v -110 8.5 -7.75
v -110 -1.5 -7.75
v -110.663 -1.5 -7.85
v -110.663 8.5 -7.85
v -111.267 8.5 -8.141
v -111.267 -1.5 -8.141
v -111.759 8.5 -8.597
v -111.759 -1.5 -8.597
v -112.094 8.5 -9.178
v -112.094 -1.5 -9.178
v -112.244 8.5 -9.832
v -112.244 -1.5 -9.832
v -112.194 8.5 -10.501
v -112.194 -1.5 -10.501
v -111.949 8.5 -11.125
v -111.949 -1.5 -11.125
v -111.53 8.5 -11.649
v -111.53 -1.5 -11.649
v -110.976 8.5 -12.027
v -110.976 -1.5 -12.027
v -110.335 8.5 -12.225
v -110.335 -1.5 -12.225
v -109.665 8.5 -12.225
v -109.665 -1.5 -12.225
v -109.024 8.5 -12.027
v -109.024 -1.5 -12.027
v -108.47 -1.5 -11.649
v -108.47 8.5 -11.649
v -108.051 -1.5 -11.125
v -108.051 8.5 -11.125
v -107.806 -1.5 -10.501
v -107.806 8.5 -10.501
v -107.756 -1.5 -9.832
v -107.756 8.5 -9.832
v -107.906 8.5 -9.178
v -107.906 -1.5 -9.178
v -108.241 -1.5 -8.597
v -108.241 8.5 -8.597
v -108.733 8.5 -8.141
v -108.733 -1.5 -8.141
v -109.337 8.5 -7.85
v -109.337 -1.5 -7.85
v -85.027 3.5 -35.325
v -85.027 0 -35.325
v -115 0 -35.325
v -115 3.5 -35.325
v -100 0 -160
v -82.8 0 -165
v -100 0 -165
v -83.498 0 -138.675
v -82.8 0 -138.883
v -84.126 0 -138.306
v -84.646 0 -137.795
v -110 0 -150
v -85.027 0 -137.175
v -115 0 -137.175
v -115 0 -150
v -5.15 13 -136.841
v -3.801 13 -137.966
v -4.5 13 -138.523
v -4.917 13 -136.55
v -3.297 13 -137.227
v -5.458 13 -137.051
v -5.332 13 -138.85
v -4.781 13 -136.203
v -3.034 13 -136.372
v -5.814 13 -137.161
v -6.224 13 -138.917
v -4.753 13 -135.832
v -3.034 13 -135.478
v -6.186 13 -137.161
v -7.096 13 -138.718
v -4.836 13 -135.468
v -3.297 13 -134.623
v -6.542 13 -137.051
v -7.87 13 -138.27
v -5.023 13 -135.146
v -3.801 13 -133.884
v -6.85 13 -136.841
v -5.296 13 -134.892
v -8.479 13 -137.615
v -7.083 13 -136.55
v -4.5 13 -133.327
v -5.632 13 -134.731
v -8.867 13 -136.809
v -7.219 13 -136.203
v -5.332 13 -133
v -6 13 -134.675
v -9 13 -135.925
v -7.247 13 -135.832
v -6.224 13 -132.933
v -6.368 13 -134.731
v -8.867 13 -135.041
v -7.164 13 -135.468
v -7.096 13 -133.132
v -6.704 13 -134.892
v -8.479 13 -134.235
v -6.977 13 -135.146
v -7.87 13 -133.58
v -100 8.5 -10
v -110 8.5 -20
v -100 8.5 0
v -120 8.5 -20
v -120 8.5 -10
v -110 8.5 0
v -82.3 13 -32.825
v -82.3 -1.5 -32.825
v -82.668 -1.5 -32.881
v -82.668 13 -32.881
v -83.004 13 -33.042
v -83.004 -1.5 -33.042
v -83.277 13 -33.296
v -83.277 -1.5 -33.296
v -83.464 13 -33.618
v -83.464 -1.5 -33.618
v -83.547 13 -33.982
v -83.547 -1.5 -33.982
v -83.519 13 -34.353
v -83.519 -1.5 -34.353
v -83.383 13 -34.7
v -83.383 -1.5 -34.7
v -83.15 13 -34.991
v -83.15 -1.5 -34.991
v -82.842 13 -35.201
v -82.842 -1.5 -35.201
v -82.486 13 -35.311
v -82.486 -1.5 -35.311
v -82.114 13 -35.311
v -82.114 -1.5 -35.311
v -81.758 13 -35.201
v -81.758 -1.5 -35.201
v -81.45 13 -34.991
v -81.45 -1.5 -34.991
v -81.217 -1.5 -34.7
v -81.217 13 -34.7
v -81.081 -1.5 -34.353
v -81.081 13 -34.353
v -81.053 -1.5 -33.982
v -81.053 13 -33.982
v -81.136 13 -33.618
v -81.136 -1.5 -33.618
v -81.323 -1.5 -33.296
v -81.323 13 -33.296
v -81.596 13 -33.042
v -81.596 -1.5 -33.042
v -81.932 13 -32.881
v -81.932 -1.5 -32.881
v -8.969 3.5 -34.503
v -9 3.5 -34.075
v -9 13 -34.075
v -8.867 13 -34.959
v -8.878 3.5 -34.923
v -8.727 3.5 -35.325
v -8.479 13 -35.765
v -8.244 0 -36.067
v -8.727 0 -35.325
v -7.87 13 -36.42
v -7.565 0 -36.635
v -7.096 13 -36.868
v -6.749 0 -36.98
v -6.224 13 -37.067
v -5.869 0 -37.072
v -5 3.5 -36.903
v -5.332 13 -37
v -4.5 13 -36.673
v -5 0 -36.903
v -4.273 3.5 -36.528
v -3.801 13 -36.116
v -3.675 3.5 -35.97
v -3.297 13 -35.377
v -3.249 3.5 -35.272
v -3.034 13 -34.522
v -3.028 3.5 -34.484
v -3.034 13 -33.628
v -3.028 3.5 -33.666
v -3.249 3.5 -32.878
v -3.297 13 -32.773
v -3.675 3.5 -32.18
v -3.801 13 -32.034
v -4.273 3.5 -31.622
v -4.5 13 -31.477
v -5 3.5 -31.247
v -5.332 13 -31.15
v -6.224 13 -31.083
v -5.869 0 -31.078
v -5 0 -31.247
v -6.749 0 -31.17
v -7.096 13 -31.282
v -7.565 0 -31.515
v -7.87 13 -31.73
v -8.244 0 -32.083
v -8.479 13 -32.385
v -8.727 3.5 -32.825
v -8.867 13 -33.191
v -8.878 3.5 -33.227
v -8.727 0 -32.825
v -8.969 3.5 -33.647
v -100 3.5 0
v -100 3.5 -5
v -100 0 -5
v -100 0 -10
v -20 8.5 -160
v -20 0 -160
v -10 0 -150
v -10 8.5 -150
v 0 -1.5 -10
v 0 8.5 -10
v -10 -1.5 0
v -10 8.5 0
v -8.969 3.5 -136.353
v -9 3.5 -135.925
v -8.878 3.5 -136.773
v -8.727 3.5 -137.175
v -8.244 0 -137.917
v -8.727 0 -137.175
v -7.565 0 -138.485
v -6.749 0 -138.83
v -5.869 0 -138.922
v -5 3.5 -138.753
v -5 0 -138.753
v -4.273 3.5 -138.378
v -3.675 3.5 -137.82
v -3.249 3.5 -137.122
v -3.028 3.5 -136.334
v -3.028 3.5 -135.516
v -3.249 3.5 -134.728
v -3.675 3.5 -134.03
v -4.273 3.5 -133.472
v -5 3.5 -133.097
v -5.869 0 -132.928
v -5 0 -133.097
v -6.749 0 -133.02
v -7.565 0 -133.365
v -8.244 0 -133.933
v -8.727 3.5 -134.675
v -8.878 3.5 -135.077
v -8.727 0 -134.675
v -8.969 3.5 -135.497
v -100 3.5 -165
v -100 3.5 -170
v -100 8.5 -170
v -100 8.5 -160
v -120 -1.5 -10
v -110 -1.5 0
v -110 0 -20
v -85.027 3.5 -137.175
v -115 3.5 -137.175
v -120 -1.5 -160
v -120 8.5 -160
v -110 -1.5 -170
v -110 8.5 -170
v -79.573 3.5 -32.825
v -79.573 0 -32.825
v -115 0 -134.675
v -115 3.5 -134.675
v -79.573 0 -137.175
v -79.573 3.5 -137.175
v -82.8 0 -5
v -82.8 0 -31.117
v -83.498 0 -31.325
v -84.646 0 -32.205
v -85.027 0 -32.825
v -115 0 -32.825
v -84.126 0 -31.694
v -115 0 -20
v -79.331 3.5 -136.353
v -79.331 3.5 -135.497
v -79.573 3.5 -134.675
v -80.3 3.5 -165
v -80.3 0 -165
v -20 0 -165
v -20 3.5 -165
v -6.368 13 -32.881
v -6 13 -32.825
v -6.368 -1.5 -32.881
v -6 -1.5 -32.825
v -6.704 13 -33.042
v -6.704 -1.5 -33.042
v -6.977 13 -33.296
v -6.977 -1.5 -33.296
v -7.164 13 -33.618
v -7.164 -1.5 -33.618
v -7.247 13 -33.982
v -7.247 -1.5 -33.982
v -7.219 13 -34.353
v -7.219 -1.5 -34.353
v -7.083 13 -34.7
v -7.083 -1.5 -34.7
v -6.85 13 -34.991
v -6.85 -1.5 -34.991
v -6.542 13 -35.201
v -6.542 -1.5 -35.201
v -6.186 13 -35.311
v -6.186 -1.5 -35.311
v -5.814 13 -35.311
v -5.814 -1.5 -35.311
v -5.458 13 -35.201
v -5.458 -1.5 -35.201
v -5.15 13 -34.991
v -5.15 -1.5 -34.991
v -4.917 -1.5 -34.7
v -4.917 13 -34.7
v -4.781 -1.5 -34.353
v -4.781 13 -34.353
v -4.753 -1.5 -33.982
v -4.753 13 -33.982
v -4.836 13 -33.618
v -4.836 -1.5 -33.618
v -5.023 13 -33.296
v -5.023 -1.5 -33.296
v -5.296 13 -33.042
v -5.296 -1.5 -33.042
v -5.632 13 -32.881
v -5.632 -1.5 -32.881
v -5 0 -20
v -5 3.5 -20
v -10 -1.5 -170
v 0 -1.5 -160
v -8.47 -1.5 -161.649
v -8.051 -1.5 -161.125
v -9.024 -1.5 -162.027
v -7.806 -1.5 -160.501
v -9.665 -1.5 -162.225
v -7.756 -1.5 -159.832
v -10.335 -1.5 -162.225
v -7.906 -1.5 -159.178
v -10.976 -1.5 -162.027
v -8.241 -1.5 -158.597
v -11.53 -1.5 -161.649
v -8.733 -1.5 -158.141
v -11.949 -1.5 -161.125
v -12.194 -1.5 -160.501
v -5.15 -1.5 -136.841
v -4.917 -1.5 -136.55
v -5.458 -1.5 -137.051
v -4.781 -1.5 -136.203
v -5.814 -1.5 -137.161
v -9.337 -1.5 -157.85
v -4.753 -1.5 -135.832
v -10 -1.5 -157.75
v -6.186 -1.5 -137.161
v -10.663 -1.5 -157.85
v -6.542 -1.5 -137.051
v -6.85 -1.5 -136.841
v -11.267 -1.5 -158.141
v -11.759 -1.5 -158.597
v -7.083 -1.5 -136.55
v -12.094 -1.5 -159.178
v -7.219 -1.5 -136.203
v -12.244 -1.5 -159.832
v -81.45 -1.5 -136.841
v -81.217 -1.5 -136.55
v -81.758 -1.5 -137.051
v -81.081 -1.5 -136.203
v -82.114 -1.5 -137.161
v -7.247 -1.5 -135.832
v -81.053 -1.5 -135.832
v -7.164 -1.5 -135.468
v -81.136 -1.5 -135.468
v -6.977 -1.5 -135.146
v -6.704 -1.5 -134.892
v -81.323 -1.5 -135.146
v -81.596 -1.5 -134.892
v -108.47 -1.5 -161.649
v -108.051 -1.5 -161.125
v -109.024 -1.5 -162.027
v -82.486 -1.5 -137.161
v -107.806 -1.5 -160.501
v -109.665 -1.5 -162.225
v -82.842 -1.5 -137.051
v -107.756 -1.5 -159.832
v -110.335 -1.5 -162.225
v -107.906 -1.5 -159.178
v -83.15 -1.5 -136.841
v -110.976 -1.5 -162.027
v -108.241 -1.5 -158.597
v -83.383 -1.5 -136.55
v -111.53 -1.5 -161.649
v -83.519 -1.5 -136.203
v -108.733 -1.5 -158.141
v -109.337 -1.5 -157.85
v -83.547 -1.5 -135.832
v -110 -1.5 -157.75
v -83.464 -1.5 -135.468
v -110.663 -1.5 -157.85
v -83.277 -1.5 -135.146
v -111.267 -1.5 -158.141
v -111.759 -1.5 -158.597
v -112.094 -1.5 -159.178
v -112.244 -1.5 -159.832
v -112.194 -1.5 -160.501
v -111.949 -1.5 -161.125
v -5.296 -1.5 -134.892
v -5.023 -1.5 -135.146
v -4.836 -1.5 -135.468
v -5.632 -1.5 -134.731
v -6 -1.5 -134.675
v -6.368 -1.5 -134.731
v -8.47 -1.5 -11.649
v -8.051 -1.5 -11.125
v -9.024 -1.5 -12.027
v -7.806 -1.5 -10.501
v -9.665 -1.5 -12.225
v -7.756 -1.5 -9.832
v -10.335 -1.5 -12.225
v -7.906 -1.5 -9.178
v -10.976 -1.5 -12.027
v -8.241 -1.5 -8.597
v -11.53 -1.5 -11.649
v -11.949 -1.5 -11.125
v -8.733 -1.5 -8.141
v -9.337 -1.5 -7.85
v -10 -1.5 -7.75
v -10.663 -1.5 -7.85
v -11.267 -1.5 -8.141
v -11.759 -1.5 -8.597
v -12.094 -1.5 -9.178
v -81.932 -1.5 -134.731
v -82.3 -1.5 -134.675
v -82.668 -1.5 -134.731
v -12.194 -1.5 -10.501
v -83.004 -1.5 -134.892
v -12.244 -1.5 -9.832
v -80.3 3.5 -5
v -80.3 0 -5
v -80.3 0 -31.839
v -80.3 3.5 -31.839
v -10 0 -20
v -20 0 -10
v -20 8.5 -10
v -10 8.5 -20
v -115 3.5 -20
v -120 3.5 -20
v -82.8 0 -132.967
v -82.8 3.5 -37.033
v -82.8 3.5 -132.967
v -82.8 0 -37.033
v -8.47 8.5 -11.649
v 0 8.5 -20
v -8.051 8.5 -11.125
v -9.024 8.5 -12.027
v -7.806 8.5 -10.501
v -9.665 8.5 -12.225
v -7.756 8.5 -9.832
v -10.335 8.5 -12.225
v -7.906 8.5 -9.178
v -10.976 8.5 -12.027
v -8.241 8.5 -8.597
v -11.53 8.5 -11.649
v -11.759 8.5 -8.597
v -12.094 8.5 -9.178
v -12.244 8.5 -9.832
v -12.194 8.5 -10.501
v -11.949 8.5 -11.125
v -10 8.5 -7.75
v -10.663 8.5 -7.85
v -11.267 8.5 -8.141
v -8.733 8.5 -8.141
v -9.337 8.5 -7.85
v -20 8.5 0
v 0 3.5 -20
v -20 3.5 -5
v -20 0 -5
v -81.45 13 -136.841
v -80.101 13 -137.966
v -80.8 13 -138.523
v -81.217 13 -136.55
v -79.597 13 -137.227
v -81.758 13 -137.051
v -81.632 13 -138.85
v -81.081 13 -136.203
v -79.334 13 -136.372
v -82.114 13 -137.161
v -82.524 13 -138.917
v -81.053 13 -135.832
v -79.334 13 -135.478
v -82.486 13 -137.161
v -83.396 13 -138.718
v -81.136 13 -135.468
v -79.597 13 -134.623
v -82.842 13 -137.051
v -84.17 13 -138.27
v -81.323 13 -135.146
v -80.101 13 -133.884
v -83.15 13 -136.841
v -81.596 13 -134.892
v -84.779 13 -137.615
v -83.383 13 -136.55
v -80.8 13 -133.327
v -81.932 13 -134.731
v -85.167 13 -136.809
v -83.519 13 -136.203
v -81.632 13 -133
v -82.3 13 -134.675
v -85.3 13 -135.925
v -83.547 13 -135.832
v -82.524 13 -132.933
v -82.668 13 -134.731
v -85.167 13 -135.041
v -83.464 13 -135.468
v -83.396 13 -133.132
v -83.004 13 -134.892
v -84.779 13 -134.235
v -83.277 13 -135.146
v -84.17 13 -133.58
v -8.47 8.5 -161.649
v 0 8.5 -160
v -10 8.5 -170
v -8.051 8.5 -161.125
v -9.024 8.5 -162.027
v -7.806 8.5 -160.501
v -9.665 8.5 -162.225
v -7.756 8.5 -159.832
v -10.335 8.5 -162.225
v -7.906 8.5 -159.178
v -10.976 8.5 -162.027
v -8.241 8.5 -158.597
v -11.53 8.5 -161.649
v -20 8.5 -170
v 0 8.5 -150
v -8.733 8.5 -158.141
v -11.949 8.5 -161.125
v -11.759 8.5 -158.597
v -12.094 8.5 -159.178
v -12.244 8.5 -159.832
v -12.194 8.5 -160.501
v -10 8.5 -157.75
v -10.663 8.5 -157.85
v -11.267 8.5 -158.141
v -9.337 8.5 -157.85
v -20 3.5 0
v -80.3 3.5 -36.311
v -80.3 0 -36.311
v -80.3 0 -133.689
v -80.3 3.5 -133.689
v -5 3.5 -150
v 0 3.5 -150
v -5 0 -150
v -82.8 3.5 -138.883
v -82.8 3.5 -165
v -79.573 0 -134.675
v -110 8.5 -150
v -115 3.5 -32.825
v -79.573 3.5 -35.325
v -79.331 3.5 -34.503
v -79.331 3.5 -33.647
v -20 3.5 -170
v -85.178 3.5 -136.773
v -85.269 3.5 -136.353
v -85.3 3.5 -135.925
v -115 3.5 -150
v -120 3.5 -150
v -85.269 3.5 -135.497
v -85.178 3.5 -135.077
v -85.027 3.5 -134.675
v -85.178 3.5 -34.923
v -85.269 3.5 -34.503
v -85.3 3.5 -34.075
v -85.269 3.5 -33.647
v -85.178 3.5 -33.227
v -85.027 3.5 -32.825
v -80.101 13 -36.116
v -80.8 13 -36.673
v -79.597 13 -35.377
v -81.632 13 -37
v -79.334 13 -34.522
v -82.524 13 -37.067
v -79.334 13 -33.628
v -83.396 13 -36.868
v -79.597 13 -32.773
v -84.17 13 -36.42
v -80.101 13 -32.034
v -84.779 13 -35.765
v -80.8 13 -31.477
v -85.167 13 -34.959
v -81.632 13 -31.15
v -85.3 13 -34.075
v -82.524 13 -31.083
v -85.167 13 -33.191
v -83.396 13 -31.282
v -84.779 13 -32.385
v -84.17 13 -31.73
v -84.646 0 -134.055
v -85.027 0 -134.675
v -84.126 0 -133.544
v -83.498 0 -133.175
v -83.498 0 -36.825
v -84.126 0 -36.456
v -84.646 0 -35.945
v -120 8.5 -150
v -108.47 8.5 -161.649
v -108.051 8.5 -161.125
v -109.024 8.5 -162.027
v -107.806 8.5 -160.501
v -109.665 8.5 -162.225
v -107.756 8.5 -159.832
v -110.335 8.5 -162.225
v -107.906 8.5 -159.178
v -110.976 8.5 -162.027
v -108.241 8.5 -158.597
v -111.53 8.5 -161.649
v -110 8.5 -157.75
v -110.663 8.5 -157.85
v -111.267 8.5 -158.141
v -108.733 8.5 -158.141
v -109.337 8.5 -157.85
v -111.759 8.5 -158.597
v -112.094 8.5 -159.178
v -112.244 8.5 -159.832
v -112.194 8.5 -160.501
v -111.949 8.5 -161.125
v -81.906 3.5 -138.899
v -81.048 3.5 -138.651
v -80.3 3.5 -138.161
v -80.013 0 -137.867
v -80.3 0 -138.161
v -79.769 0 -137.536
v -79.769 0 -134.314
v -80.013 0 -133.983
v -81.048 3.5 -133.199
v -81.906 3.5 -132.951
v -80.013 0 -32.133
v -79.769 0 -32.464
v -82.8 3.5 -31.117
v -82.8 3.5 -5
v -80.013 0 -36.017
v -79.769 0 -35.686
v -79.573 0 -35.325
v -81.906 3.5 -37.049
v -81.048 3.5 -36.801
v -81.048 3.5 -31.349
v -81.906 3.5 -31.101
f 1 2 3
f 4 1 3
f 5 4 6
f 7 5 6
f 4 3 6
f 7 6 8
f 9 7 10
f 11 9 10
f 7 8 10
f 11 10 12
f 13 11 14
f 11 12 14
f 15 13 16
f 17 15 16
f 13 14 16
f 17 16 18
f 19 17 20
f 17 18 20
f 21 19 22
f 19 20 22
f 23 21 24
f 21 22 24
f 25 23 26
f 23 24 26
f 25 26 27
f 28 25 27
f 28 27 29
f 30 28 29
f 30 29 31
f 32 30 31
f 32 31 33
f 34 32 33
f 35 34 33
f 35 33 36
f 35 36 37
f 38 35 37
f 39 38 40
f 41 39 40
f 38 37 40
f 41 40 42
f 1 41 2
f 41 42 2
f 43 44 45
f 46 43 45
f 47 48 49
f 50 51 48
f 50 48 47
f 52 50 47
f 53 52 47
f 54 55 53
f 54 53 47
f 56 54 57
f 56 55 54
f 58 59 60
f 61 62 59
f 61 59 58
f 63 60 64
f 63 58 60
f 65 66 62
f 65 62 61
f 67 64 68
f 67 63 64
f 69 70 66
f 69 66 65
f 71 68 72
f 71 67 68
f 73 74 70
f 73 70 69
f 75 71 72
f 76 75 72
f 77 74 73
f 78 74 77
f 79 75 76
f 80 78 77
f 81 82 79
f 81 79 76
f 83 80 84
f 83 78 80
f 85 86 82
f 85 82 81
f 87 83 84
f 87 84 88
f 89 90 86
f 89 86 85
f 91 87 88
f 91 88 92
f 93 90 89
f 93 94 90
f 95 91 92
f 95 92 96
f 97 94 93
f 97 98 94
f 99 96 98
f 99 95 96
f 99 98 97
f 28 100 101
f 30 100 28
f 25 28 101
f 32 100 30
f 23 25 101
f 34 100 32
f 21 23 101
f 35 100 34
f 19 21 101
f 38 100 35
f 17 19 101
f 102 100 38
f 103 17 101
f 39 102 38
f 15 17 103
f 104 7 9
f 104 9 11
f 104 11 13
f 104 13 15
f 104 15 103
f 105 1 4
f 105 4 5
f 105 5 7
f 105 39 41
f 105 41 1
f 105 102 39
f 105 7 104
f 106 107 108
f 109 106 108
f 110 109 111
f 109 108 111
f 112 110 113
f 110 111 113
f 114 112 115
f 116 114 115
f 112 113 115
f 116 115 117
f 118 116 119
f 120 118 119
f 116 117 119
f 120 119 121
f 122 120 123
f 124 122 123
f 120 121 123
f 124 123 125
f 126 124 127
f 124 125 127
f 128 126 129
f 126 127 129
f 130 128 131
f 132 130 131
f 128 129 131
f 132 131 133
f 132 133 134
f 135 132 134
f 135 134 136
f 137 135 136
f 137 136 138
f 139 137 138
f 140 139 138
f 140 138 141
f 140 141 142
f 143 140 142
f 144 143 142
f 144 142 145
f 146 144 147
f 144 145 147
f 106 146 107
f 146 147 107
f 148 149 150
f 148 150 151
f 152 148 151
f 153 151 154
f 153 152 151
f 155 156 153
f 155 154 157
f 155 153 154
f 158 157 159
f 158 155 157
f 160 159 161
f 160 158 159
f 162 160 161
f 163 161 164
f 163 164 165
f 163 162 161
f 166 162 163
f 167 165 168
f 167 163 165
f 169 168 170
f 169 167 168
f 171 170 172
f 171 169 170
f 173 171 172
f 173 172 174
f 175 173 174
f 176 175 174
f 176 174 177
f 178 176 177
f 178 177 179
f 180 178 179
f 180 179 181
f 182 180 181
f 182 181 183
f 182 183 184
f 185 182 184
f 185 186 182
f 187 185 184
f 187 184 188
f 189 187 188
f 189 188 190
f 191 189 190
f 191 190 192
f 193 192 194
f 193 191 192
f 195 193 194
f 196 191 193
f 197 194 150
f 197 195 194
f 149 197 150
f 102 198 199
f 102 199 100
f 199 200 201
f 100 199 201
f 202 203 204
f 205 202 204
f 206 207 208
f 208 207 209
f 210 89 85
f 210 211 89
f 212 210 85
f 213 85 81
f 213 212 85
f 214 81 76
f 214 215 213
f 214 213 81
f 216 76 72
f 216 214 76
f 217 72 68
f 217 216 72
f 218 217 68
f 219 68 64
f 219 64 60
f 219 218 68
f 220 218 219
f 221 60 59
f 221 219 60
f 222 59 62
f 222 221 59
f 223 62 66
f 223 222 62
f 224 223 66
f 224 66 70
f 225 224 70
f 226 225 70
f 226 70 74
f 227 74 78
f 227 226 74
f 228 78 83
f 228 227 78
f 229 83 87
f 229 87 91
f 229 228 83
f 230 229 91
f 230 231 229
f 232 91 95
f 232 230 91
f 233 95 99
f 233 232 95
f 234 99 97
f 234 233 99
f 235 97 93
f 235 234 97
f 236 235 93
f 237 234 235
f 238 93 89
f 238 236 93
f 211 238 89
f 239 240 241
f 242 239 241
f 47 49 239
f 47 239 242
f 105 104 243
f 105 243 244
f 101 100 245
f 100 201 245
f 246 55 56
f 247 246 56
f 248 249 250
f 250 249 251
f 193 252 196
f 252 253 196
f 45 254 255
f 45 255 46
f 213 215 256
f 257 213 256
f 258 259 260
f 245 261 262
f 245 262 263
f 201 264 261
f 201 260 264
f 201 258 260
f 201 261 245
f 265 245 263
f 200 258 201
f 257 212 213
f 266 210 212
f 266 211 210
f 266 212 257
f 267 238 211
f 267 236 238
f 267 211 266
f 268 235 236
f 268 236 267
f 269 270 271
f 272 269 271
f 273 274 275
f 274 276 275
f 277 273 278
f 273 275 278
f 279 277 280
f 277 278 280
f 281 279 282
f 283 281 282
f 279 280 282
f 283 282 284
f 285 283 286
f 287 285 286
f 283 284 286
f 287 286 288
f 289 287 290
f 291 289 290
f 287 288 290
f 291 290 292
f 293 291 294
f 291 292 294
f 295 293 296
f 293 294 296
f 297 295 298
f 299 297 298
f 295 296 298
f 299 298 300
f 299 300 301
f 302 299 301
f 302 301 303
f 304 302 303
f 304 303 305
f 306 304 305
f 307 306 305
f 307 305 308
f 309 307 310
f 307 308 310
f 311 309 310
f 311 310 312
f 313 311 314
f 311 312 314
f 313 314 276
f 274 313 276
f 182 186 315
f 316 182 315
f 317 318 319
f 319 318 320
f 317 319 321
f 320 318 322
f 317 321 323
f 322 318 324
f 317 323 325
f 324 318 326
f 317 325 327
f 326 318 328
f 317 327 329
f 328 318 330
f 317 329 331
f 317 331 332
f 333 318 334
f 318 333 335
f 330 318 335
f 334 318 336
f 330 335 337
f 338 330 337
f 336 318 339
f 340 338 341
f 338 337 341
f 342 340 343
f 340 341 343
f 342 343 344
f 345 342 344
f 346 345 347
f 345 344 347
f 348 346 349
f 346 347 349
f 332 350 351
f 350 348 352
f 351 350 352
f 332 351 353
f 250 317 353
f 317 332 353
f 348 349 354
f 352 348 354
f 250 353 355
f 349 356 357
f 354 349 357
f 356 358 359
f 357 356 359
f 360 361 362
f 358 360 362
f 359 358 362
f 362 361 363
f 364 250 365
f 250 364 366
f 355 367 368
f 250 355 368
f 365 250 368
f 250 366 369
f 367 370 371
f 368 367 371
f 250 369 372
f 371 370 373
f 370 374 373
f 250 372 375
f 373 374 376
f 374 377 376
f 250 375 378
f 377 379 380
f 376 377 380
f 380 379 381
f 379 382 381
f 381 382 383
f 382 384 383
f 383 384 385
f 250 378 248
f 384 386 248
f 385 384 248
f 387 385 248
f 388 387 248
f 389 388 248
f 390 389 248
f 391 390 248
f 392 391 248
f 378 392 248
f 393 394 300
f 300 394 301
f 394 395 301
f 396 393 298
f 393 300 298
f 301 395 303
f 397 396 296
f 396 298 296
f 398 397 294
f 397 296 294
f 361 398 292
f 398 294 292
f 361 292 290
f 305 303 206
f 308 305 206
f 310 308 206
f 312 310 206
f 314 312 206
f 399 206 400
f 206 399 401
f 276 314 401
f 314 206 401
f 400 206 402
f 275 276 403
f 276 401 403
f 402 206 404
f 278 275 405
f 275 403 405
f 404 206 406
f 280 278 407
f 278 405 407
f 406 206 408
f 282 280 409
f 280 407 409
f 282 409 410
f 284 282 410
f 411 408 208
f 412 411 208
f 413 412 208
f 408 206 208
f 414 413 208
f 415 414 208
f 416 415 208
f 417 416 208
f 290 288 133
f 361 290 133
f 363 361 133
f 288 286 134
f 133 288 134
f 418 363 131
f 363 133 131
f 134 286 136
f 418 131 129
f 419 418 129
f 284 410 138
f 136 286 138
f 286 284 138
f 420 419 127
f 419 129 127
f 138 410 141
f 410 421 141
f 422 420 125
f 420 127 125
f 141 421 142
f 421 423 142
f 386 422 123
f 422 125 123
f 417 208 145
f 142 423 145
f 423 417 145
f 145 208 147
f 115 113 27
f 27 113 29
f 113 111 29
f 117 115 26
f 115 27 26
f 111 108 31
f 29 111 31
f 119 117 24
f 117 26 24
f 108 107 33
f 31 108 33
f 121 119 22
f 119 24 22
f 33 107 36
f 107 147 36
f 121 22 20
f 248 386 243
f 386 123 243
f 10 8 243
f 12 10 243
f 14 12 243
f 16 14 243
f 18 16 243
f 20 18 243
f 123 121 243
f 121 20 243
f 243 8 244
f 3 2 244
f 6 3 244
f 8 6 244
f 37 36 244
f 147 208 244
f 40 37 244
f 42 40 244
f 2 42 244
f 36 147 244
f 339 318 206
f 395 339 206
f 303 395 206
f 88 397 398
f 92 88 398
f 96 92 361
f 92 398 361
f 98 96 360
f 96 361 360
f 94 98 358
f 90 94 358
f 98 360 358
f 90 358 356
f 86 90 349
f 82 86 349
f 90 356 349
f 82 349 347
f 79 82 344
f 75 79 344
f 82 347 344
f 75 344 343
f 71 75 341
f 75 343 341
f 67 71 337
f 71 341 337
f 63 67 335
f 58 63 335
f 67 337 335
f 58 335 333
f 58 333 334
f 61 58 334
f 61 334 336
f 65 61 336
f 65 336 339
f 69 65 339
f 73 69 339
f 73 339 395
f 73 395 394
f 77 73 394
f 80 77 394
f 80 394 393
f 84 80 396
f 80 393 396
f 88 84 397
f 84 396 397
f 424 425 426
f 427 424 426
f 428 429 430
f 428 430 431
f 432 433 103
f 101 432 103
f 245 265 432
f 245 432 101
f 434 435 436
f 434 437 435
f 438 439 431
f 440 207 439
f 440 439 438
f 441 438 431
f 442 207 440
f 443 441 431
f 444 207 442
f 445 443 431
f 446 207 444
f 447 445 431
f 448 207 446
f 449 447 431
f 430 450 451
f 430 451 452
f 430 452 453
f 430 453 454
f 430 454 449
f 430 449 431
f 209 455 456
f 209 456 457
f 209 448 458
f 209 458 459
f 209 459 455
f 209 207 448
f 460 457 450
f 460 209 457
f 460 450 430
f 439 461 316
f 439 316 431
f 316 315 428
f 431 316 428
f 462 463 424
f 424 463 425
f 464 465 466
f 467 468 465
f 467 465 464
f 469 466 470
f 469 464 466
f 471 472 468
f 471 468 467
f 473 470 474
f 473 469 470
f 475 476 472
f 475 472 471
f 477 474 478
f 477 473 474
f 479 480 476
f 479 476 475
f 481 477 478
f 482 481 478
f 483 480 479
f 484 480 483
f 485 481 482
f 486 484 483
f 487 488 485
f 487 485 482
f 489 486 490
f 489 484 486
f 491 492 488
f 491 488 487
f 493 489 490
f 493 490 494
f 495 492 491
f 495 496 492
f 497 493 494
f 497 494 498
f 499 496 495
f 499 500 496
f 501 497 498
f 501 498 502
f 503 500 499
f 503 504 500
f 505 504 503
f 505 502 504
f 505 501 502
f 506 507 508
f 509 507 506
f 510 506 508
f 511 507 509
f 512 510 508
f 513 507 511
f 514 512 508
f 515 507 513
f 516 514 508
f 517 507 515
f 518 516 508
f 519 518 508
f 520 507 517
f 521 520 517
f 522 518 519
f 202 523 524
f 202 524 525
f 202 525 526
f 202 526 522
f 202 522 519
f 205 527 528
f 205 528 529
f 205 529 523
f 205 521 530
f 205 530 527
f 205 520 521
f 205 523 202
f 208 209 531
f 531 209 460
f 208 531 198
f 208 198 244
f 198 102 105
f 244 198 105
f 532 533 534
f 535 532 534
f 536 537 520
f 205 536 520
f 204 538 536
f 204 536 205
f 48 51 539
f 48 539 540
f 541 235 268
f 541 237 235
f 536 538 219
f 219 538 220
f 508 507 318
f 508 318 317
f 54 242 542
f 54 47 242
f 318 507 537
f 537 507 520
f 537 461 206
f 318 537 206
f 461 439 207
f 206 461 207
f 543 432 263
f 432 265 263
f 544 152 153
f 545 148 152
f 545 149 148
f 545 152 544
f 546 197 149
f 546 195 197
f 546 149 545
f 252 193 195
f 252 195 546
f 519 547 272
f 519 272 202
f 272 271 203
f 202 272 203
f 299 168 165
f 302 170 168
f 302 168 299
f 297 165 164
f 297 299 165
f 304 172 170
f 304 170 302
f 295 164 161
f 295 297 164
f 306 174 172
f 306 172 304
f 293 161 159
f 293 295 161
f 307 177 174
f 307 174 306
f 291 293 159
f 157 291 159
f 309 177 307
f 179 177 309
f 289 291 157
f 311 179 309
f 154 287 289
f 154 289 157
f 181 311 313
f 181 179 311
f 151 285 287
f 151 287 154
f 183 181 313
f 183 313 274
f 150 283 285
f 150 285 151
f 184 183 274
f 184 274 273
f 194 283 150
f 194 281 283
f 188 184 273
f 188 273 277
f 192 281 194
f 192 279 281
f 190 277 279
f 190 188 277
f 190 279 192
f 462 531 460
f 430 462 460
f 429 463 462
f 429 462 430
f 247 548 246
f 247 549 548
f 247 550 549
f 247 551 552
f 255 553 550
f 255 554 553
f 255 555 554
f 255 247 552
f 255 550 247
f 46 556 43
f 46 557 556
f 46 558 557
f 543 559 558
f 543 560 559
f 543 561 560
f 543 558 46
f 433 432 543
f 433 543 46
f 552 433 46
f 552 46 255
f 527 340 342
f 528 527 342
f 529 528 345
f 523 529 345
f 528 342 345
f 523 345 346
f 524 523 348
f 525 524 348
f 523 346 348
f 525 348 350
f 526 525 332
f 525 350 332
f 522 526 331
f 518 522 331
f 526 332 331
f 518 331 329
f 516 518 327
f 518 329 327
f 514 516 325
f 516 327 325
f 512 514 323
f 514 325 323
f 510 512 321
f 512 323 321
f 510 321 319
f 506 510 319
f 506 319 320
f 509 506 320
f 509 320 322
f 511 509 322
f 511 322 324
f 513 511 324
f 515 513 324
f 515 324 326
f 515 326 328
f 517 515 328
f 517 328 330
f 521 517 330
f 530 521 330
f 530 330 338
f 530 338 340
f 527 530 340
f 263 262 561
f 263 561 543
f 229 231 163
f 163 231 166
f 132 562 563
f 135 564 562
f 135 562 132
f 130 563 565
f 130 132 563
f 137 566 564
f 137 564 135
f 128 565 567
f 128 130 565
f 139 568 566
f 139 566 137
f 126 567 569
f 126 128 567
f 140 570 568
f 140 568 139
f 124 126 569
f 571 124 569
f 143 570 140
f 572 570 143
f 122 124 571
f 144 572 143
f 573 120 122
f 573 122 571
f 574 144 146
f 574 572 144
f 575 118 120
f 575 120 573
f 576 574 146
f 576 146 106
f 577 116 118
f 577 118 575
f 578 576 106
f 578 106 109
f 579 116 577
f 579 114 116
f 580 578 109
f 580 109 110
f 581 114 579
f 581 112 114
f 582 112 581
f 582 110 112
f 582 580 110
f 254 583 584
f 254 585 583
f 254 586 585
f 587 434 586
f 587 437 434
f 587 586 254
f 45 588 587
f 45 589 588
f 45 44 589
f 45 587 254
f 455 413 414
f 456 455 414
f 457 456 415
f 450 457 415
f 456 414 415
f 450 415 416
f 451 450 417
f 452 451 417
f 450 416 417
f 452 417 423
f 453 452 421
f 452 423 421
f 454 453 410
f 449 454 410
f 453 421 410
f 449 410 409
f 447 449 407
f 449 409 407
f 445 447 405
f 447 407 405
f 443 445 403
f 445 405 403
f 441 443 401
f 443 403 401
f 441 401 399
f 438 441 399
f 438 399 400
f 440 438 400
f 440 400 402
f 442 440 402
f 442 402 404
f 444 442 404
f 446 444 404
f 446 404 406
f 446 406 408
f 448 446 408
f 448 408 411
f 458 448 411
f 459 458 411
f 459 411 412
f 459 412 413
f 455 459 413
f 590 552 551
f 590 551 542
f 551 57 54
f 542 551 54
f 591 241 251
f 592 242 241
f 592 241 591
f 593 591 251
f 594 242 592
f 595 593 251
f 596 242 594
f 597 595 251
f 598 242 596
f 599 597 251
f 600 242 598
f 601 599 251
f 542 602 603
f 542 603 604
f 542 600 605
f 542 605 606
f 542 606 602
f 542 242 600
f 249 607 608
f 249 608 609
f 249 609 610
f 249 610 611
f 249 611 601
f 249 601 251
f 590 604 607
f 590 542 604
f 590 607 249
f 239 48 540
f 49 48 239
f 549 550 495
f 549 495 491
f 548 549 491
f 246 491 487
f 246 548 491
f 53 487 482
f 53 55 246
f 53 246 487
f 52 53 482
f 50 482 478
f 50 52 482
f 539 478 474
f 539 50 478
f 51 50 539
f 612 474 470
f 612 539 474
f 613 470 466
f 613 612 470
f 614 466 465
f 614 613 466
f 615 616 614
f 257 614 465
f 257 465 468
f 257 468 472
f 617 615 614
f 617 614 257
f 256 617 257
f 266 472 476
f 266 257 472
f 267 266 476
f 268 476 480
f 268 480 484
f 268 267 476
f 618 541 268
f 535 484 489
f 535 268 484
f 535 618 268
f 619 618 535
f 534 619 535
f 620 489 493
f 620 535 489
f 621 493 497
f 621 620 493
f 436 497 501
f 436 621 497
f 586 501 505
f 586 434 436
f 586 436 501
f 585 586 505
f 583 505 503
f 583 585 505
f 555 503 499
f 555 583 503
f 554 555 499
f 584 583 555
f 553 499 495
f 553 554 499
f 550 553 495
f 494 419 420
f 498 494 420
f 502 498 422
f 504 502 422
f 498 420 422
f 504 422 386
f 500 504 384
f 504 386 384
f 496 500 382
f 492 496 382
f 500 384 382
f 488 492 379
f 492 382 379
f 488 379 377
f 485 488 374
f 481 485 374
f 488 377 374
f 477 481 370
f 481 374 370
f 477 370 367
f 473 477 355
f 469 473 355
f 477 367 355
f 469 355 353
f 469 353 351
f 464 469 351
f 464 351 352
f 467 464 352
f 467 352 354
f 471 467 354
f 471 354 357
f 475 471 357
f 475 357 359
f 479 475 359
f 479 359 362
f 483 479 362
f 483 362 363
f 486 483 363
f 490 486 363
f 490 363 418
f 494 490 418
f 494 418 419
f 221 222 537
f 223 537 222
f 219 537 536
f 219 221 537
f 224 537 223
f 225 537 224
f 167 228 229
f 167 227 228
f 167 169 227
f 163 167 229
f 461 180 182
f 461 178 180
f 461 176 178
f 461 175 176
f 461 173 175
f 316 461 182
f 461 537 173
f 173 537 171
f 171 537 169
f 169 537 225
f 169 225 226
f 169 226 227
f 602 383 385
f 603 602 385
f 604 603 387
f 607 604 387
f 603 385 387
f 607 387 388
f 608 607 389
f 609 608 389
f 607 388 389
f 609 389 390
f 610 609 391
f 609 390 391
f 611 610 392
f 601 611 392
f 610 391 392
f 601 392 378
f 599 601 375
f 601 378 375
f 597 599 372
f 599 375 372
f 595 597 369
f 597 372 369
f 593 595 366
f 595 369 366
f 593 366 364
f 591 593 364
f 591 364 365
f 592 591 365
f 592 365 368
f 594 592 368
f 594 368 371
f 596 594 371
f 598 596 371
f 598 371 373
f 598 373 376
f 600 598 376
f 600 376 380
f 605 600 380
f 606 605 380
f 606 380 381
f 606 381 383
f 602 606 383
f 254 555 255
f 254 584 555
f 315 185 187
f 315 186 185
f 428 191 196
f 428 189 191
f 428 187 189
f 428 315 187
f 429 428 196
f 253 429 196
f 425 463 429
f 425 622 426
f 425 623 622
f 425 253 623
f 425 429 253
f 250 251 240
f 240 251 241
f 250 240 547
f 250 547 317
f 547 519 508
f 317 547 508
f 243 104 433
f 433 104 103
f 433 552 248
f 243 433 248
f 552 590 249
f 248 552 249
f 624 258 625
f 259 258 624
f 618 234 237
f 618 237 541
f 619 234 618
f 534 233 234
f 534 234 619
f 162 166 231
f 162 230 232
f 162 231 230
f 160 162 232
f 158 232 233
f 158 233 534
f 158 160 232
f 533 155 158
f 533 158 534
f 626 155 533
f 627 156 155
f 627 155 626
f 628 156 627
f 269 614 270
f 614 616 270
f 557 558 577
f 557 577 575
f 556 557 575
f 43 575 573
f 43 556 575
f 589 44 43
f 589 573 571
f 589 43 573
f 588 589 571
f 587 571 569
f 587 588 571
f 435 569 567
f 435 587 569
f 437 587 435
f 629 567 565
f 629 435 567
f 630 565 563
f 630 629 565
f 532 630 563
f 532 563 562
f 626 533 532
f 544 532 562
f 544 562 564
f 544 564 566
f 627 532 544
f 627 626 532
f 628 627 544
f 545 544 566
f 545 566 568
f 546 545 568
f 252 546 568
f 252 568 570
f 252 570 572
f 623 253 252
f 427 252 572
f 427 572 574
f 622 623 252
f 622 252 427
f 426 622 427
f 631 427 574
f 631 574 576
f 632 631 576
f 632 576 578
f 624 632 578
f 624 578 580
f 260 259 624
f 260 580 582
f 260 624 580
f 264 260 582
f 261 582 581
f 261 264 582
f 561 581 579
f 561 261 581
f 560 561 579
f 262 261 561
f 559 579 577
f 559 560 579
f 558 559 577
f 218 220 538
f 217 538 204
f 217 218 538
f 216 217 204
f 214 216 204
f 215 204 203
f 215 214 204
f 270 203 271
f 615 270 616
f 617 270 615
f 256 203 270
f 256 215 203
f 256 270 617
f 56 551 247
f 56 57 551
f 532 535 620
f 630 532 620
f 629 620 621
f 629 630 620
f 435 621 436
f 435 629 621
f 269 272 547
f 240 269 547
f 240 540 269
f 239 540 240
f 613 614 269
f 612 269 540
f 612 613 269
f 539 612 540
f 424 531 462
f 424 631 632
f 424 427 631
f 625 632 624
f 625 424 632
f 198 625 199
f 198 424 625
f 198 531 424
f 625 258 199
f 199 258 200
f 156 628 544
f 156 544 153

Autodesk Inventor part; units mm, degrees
ref_plane "YZ Plane" through (0, 0, 0) normal (1, 0, 0) x (0, 1, 0)
ref_plane "XZ Plane" through (0, 0, 0) normal (0, 1, 0) x (-1, 0, 0)
ref_plane "XY Plane" through (0, 0, 0) normal (0, 0, 1) x (1, 0, 0)
sketch "Base Sketch" plane through (0, 0, 0) normal (0, 1, 0) x (-1, 0, 0)
  line L0 (10, 0) -> (110, 0)
  line L1 (120, -10) -> (120, -160)
  line L2 (110, -170) -> (10, -170)
  line L3 (0, -160) -> (0, -10)
  line L4 (86.3, -30.165) -> (2, -30.165) construction
  line L5 (2, -30.165) -> (2, -139.835) construction
  line L6 (2, -139.835) -> (86.3, -139.835) construction
  line L7 (86.3, -139.835) -> (86.3, -30.165) construction
  line L8 (82.3, -34.075) -> (6, -34.075) construction
  line L9 (6, -34.075) -> (6, -135.925) construction
  line L10 (6, -135.925) -> (82.3, -135.925) construction
  line L11 (82.3, -135.925) -> (82.3, -34.075) construction
  line L12 (0, -10) -> (10, 0)
  line L13 (120, -10) -> (110, 0)
  line L14 (120, -160) -> (110, -170)
  line L15 (0, -160) -> (10, -170)
  line L16 (100, 0) -> (100, -10)
  line L17 (120, -20) -> (110, -20)
  line L18 (100, -10) -> (110, -20)
  line L19 (120, -85) -> (0, -85) construction
  line L20 (60, 0) -> (60, -170) construction
  line L21 (100, -170) -> (100, -160)
  line L22 (120, -150) -> (110, -150)
  line L23 (100, -160) -> (110, -150)
  line L24 (20, 0) -> (20, -10)
  line L25 (0, -20) -> (10, -20)
  line L26 (20, -10) -> (10, -20)
  line L27 (20, -170) -> (20, -160)
  line L28 (20, -160) -> (10, -150)
  line L29 (0, -150) -> (10, -150)
  circle A0 centre (82.3, -34.075) radius 3
  circle A1 centre (6, -34.075) radius 3
  circle A2 centre (82.3, -135.925) radius 3
  circle A3 centre (6, -135.925) radius 3
  line L30 (82.8, -5) -> (82.8, -31.117)
  line L31 (80.3, -5) -> (80.3, -31.8389)
  line L32 (80.3, -36.3111) -> (80.3, -133.6889)
  line L33 (80.3, -138.1611) -> (80.3, -165)
  line L34 (82.8, -37.033) -> (82.8, -132.967)
  line L35 (82.8, -138.883) -> (82.8, -165)
  line L36 (79.5728, -35.325) -> (8.7272, -35.325)
  line L37 (79.5728, -32.825) -> (8.7272, -32.825)
  line L38 (85.0272, -35.325) -> (115, -35.325)
  line L39 (85.0272, -32.825) -> (115, -32.825)
  line L40 (8.7272, -134.675) -> (79.5728, -134.675)
  line L41 (85.0272, -134.675) -> (115, -134.675)
  line L42 (8.7272, -137.175) -> (79.5728, -137.175)
  line L43 (85.0272, -137.175) -> (115, -137.175)
  line L44 (80.3, -165) -> (12.0711, -165)
  line L45 (12.0711, -165) -> (5, -157.9289)
  line L46 (5, -157.9289) -> (5, -12.0711)
  line L47 (5, -12.0711) -> (12.0711, -5)
  line L48 (12.0711, -5) -> (80.3, -5)
  line L49 (82.8, -165) -> (107.9289, -165)
  line L50 (107.9289, -165) -> (115, -157.9289)
  line L51 (115, -157.9289) -> (115, -137.175)
  line L52 (82.8, -5) -> (107.9289, -5)
  line L53 (107.9289, -5) -> (115, -12.0711)
  line L54 (115, -12.0711) -> (115, -32.825)
  line L55 (115, -134.675) -> (115, -35.325)
  point P0 (0, 0)
  point P1 (120, -170)
  point P2 (120, 0)
  point P3 (0, -170)
  point P4 (110, -10)
  point P5 (110, -160)
  point P6 (10, -10)
  point P7 (10, -160)
  point P8 (20, -165)
  point P9 (100, -165)
  point P10 (115, -150)
  point P11 (115, -20)
  point P12 (100, -5)
  point P13 (20, -5)
  point P14 (5, -150)
  point P15 (5, -138.7534)
  point P16 (5, -133.0966)
  point P17 (5, -36.9034)
  point P18 (5, -31.2466)
  point P19 (5, -20)
  dimension "d109" = 6
  dimension "d0" = 120
  dimension "d1" = 170
  dimension "d12" = 84.3
  dimension "d13" = 109.67
  dimension "d14" = 76.3
  dimension "d15" = 101.85
  dimension "d16" = 3.91
  dimension "d17" = 3.91
  dimension "d18" = 4
  dimension "d19" = 4
  dimension "d20" = 2
  dimension "d21" = 30.165
  dimension "d22" = 30.165
  dimension "d82" = 10
  dimension "d83" = 10
  dimension "d84" = 10
  dimension "d85" = 10
  dimension "d88" = 10
  dimension "d90" = 10
  dimension "d91" = 10
  dimension "d93" = 10
  dimension "d94" = 190.9188
  dimension "d95" = 10
  dimension "d96" = 0
  dimension "d101" = 10
  dimension "d102" = 10
  dimension "d103" = 10
  dimension "d104" = 10
  dimension "d113" = 76.3
  dimension "d116" = 101.85
  dimension "d143" = 10
  dimension "d144" = 10
  dimension "d166" = 90
  dimension "d167" = 90
  dimension "d168" = 90
  dimension "d169" = 90
  dimension "d170" = 90
  dimension "d171" = 135
  dimension "d172" = 135
  dimension "d173" = 45
  dimension "d174" = 45
  dimension "d175" = 45
  dimension "d176" = 45
  dimension "d177" = 5
  dimension "d178" = 37.2
  dimension "d179" = 39.7
  dimension "d180" = 115
  dimension "d181" = 5
  dimension "d182" = 185.9188
  dimension "d183" = 9.1421
  dimension "d184" = 180.9188
  dimension "d185" = 2.5
  dimension "d186" = 104.35
  dimension "d187" = 101.85
  dimension "d188" = 27.825
  dimension "d189" = 132.175
  dimension "d190" = 12.825
  dimension "d191" = 160
  dimension "d192" = 115
  dimension "d193" = 115
  dimension "d194" = 82.8
  dimension "d195" = 82.8
  dimension "d196" = 80.3
  dimension "d197" = 80.3
extrude "Main Body" add sketch "Base Sketch" against normal blind 1.5
extrude "Structure" add sketch "Base Sketch" along normal blind 3.5 contours L0 L16 L52 L30 A0 L31 L48 L24 | L25 L46 A1 A3 L29 L3 | L1 L22 L51 L43 A2 L41 L55 L38 A0 L39 L54 L17 | A0 L36 A1 L37 | L27 L44 L33 A2 L35 L49 L21 L2 | A3 L40 A2 L42 | A0 L34 A2 L32
extrude "Corners" add sketch "Base Sketch" along normal blind 8.5 contours L0 L24 L48 L47 L46 L25 L3 L12 | L0 L13 L1 L17 L54 L53 L52 L16 | L24 L26 L25 L46 L47 L48 | L52 L53 L54 L17 L18 L16 | L29 L46 L45 L44 L27 L2 L15 L3 | L29 L28 L27 L44 L45 L46 | L1 L14 L2 L21 L49 L50 L51 L22 | L51 L50 L49 L21 L23 L22
extrude "Board Standoffs" add sketch "Base Sketch" along normal blind 13 contours A0 | L46 A1 | A1 L46 | L46 A3 | A3 L46 | A2
hole "Standoff Hole" at (-6, 0, -34.075) at (-6, 0, -135.925) at (-82.3, 0, -135.925) at (-82.3, 0, -34.075) direction (0, -1, 0) diameter 2.5 end through all both
hole "Corner Hole" at (-110, 0, -10) at (-110, 0, -160) at (-10, 0, -10) at (-10, 0, -160) direction (0, -1, 0) diameter 4.5 end through all both
equation "\"d16\" = d17"
equation "\"d18\" = d19"
equation "\"d21\" = d22"
equation "\"d113\" = d14"
equation "\"d116\" = d15"
properties part number "Prod5.2.1 - SKR1.4 Turbo Case Base"
